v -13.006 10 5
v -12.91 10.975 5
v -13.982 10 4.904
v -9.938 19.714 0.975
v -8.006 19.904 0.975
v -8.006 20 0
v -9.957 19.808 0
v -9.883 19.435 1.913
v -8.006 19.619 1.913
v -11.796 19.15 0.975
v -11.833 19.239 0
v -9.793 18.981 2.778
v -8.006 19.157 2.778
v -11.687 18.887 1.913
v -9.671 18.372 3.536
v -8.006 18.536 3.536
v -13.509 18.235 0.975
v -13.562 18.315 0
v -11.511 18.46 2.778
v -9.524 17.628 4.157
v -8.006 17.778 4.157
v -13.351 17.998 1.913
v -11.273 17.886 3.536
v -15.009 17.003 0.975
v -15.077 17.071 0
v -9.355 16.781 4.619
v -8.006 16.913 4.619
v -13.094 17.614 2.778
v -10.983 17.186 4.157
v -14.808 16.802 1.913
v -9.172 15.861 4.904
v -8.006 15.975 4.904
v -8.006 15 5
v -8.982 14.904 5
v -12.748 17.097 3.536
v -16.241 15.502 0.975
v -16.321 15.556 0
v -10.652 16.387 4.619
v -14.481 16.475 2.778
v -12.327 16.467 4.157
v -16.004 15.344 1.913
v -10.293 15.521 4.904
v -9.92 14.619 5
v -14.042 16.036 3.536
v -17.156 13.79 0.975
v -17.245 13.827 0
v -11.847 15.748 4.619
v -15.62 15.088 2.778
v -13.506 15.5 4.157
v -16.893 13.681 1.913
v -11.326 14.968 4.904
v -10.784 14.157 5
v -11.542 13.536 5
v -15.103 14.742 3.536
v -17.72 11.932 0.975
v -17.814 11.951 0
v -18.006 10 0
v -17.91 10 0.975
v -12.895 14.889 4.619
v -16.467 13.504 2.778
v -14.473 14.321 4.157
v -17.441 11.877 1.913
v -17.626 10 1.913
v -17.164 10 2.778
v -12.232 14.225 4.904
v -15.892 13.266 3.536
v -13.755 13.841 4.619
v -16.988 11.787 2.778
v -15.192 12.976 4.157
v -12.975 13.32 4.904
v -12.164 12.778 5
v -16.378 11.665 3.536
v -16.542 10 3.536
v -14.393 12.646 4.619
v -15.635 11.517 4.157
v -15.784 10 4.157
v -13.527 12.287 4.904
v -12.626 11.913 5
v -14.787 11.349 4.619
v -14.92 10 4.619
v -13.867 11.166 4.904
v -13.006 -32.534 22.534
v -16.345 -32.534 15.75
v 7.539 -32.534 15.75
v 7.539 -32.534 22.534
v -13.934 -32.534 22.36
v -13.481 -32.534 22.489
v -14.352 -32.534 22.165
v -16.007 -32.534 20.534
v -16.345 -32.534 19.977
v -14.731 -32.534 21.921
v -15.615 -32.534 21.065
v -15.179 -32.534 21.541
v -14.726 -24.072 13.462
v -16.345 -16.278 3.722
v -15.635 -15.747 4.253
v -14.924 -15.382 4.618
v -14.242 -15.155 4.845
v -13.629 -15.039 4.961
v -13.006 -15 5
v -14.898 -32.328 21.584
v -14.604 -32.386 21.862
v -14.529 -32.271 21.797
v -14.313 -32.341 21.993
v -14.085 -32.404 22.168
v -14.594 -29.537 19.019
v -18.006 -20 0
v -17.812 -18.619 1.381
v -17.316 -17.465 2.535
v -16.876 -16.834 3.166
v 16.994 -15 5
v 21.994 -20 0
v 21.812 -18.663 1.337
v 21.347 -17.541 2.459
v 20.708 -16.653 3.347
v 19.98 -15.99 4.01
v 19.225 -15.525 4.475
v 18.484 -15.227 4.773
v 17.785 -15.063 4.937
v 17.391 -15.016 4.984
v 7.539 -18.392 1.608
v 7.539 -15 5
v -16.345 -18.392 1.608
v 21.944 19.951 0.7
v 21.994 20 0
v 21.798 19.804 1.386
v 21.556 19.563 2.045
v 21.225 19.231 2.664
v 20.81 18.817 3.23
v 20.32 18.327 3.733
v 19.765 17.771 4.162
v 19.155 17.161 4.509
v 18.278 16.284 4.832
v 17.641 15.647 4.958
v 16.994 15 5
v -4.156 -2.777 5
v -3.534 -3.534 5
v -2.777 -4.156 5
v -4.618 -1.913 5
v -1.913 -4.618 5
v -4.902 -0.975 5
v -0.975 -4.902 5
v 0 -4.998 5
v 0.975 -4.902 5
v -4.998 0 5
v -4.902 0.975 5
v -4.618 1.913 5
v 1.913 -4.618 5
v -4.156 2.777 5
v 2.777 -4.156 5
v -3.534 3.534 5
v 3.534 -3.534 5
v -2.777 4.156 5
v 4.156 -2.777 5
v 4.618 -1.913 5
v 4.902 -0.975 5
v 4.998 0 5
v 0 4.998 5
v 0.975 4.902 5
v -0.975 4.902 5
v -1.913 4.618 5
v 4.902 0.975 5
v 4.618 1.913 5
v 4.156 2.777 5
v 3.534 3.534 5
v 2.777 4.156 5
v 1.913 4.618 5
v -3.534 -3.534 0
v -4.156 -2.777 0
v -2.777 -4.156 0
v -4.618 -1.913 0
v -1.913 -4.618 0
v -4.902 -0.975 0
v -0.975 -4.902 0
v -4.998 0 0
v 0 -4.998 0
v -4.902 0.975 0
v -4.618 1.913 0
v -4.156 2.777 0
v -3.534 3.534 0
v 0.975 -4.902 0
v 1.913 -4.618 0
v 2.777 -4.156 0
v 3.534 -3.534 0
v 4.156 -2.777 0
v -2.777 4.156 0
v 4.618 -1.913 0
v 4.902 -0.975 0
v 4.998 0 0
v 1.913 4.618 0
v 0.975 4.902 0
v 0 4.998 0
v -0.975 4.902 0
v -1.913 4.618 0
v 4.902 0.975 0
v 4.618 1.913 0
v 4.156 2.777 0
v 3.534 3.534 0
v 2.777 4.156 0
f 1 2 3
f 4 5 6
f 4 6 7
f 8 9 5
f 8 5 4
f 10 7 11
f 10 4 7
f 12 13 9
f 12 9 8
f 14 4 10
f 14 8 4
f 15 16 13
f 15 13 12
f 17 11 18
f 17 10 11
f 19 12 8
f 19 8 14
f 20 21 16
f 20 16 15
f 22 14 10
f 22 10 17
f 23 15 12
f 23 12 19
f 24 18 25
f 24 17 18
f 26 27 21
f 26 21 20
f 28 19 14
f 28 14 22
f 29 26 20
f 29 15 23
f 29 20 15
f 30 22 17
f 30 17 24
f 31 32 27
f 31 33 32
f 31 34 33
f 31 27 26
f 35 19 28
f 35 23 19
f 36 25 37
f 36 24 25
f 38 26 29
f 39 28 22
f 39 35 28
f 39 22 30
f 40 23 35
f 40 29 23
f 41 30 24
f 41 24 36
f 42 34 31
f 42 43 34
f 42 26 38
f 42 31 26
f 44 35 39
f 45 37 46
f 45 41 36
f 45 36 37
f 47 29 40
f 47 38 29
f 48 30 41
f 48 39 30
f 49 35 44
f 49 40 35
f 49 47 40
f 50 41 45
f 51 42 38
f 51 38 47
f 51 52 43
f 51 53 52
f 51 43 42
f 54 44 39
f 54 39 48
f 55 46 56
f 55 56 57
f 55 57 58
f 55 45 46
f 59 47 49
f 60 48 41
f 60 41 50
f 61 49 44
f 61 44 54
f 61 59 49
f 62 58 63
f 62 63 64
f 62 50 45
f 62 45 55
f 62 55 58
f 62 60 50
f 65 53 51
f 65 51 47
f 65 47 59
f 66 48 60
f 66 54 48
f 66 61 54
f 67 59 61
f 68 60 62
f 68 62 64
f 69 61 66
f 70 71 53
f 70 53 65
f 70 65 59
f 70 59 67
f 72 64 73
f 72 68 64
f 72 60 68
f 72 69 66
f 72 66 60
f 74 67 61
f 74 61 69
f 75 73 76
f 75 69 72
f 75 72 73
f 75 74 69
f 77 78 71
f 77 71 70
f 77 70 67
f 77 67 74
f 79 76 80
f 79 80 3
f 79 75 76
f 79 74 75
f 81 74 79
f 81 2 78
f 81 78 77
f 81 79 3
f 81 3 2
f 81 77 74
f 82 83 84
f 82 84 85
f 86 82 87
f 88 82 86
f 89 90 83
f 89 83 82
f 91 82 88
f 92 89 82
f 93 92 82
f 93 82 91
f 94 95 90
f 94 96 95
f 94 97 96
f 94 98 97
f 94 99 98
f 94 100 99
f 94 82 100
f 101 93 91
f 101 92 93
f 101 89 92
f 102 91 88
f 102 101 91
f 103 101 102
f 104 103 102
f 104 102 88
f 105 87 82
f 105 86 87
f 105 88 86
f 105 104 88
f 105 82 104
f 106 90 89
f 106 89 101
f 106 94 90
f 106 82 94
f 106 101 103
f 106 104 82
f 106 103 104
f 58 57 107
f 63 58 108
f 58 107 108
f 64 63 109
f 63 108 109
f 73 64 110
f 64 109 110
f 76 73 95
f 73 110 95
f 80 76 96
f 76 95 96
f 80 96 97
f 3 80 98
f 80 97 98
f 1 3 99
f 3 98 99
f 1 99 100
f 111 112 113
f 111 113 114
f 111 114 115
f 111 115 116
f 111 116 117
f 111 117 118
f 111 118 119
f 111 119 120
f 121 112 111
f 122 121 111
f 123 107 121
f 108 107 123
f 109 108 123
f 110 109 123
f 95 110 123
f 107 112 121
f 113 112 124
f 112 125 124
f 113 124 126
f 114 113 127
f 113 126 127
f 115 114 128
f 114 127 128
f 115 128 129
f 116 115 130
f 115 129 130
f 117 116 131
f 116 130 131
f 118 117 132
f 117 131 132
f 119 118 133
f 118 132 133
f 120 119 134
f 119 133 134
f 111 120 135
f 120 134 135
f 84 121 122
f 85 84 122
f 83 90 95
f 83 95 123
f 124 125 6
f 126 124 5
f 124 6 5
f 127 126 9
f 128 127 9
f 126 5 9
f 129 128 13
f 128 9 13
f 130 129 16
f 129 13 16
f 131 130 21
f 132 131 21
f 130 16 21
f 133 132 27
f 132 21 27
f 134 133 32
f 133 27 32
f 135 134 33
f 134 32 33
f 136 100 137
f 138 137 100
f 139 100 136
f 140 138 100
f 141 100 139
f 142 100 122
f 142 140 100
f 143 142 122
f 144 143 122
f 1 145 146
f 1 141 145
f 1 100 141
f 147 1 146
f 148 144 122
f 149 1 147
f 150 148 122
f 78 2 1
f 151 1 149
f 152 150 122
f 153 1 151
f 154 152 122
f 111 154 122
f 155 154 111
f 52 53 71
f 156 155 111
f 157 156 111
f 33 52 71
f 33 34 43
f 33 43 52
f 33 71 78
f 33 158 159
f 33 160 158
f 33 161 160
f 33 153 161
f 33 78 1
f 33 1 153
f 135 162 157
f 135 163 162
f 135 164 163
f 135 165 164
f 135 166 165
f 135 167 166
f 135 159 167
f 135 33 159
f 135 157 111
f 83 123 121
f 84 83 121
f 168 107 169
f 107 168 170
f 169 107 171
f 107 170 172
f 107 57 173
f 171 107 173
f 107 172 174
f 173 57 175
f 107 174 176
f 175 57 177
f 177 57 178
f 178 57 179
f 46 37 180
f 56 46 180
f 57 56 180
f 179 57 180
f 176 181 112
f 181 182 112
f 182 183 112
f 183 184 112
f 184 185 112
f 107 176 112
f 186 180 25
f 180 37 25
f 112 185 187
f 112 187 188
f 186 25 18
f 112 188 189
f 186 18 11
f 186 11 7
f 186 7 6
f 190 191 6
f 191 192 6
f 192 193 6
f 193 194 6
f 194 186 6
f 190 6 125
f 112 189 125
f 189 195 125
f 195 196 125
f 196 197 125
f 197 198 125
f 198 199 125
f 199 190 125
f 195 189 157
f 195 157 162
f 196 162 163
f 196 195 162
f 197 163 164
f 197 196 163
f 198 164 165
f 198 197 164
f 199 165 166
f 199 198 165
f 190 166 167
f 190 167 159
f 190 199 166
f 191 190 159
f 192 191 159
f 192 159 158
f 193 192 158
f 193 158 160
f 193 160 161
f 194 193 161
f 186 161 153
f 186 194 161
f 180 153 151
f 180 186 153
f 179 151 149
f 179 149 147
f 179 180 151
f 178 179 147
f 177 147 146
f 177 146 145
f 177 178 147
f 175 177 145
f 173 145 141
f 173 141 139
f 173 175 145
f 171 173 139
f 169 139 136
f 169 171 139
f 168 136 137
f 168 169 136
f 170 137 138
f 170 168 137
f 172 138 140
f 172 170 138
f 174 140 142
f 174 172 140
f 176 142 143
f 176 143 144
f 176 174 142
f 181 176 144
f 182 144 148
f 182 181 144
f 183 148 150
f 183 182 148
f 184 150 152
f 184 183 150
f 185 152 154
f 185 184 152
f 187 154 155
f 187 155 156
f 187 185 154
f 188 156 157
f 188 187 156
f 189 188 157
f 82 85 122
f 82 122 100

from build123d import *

# Parameters (mm, degrees)
F0_R        = 4.998
F1_DEPTH    = 5
F2_T1_DEPTH = 65.7168298797
F4_R        = 4.99999
F6_DEPTH    = 25
F7_T1_DEPTH = 49.600858076


# Not quite as in the source:
# - a fillet or chamfer that OpenCascade refuses, or shapes differently, is made with other operations: its cross-section is extruded or revolved along the edge and cut away or added
# - a fillet or chamfer is up to 0.001 mm smaller than in the source, because OpenCascade refuses the exact size
# - a feature of the source that left no trace in its solid (it failed there, or was rolled back) is left out


with BuildPart() as f1:
    # F0 (on Top) → F1 (new body)
    with BuildSketch(Plane.XY):
        with BuildLine():
            Line((-18.0062504657, -20), (21.9937495343, -20))
            Line((21.9937495343, -20), (21.9937495343, 20))
            Line((21.9937495343, 20), (-8.0062504657, 20))
            ThreePointArc((-8.0062504657, 20), (-15.0773182775, 17.0710678119), (-18.0062504657, 10))
            Line((-18.0062504657, 10), (-18.0062504657, -20))
        make_face()
        Circle(F0_R, mode=Mode.SUBTRACT)
    extrude(amount=F1_DEPTH)

    # F2: chamfer of 5 on 1 edges, made by hand

    # F2_s2 → F2_t1 (cut)
    with BuildSketch(Plane.YZ.offset(-30.8646654055)):
        Polygon((-20, 0), (-15, 5), (-20, 5), align=None)
    extrude(amount=F2_T1_DEPTH, mode=Mode.SUBTRACT)

    # F4 (radius 5 in the source; OpenCascade refuses exactly that, so slightly less here)
    f4_edges = [f1.edges().sort_by_distance(p)[0] for p in [
        (21.99375, 2.5, 5),
        (-18.00625, -2.5, 5),
        (-15.077318, 17.071068, 5),
        (6.99375, 20, 5),
    ]]
    fillet(f4_edges, radius=F4_R)

    # F5 (on face) → F6 (join)
    with BuildSketch(Plane(origin=(0, -10, 10), x_dir=(1, 0, 0), z_dir=(0, -0.7071067812, 0.7071067812))):
        with BuildLine():
            Line((-16.3453794084, -11.8680624291), (7.5386487879, -11.8680624291))
            Line((7.5386487879, -11.8680624291), (7.5386487879, -7.0710678119))
            Line((7.5386487879, -7.0710678119), (-13.0062604657, -7.0710678119))
            add(Edge.make_bspline(
                [(-16.3453794084, -8.8790074441), (-14.9205436029, -7.0710678119), (-13.0062604657, -7.0710678119)],
                knots=[2.4075114321, 2.4075114321, 2.4075114321, 3.1415926536, 3.1415926536, 3.1415926536], degree=2, weights=[0.8541785937, 0.8631220304, 1]))
            Line((-16.3453794084, -8.8790074441), (-16.3453794084, -11.8680624291))
        make_face()
    extrude(amount=F6_DEPTH)

    # F7: chamfer of 5 on 1 edges, made by hand

    # F7_s2 → F7_t1 (cut)
    with BuildSketch(Plane.YZ.offset(-29.2037943483)):
        Polygon((-32.5341230469, 15.7501482005), (-32.5341230469, 22.8212160124), (-36.0696569528, 19.2856821065), align=None)
    extrude(amount=F7_T1_DEPTH, mode=Mode.SUBTRACT)


solid = f1.part
